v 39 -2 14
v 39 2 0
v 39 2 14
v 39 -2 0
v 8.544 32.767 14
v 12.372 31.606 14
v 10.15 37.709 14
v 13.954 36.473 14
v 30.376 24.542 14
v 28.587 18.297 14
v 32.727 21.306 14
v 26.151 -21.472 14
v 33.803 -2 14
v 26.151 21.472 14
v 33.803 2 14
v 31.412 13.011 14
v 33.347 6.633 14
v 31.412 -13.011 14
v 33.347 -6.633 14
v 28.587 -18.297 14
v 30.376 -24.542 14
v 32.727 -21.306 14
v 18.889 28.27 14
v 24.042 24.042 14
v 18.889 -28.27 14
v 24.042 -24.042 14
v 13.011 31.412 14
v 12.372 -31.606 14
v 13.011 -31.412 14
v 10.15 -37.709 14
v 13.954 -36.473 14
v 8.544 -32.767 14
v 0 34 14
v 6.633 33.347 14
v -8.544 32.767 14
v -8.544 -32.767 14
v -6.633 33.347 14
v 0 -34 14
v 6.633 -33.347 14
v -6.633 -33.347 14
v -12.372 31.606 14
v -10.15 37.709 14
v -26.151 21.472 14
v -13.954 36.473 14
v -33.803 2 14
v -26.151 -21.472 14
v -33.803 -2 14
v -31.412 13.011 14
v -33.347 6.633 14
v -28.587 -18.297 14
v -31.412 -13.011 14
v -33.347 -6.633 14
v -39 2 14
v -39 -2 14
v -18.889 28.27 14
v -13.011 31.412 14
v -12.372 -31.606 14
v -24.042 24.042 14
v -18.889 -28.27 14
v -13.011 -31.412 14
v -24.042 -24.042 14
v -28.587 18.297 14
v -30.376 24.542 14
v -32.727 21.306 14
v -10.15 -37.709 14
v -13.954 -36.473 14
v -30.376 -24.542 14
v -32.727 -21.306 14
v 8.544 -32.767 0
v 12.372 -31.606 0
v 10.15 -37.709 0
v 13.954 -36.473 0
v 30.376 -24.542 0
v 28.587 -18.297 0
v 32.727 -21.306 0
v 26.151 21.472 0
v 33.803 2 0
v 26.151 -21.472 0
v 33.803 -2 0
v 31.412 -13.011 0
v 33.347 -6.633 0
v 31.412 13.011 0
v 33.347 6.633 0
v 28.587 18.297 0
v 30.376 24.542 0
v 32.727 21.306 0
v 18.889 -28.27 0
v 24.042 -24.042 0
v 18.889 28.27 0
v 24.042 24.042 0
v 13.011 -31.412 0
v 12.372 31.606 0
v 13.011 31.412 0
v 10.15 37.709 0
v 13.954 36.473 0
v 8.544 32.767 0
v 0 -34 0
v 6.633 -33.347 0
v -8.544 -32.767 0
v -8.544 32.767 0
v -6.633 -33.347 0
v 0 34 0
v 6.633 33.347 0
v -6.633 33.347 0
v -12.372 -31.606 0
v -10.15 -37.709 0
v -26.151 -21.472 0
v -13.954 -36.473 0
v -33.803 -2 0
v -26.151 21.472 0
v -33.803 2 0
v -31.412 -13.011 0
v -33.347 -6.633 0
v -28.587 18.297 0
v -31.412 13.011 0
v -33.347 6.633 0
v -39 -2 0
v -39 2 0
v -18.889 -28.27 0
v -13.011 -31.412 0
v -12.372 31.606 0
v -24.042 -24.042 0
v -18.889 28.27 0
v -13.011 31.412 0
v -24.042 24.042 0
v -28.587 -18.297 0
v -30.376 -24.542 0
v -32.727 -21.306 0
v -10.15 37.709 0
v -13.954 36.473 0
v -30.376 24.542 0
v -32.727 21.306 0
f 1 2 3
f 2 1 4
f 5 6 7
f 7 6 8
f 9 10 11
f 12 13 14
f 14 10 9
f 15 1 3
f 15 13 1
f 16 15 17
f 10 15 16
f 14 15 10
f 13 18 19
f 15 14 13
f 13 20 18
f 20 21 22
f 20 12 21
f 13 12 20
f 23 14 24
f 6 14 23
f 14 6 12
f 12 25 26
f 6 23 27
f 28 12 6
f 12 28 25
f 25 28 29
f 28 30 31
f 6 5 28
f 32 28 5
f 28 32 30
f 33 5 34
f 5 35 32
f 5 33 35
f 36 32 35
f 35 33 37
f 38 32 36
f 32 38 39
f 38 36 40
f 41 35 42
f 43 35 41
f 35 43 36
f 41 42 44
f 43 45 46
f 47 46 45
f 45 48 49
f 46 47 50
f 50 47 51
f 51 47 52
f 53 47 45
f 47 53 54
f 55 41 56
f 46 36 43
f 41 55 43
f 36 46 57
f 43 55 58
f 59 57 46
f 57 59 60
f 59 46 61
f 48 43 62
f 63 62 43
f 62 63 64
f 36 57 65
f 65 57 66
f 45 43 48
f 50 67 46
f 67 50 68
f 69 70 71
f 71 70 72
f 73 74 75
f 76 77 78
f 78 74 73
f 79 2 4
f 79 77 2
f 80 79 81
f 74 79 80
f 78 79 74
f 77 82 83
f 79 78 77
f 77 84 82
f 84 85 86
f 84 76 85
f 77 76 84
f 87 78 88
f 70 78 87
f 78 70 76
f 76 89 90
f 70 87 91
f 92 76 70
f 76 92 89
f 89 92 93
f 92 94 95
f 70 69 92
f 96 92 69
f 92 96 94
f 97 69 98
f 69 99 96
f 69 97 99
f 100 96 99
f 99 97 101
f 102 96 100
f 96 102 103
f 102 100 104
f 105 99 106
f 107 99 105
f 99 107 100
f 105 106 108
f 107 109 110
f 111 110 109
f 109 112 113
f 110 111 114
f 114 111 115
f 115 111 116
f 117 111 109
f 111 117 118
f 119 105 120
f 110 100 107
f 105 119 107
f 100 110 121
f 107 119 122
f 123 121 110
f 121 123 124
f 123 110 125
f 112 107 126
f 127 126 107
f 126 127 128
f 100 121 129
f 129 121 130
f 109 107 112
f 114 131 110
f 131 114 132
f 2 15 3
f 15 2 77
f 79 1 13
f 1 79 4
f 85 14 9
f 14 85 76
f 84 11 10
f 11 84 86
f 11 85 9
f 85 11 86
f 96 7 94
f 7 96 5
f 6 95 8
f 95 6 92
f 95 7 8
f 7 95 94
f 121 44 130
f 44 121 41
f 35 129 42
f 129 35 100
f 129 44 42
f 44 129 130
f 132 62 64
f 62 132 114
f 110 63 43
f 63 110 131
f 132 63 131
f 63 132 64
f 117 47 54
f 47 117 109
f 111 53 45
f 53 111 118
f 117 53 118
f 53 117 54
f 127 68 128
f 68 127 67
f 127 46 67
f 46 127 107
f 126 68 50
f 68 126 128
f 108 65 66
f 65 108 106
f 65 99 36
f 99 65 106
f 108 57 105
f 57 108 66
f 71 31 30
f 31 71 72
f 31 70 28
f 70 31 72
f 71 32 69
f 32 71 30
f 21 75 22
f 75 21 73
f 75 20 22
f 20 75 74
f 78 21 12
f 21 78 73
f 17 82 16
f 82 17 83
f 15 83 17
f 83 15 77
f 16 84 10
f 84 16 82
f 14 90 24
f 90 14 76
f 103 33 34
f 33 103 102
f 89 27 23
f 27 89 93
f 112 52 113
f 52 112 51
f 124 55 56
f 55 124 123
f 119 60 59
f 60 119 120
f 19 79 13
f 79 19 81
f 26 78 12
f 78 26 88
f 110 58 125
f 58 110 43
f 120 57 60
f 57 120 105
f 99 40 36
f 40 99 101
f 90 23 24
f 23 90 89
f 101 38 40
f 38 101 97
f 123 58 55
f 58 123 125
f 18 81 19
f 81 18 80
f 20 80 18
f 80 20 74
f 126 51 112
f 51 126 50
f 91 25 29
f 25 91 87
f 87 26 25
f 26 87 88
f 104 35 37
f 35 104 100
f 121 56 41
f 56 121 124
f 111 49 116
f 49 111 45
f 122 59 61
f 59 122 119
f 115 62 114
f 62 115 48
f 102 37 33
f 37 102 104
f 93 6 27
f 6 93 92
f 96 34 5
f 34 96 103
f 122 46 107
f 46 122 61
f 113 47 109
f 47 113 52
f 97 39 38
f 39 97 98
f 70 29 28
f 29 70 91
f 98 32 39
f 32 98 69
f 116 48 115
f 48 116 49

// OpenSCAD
$fn = 32;

// ----------------------------------------------------------------------
// Spur blank: plain gear blank
// ----------------------------------------------------------------------

// --- parameters (mm) ---
disc_r = 34;              // blank root radius
disc_t = 14;              // blank thickness
n_teeth = 10;             // stub tooth count
tooth_w = 4;              // tooth width at the root
tooth_h = 5;              // tooth height above the root

out_r = disc_r + tooth_h;  // tip radius
bbox_x = 78.0;  // measured width over the teeth
bbox_y = 75.42;  // measured depth over the teeth

union() {
  cylinder(r = disc_r, h = disc_t);
  for (i = [0 : n_teeth - 1])
    rotate([0, 0, i * 360 / n_teeth])
      translate([disc_r - 1, -tooth_w / 2, 0])
        cube([tooth_h + 1, tooth_w, disc_t]);
}
